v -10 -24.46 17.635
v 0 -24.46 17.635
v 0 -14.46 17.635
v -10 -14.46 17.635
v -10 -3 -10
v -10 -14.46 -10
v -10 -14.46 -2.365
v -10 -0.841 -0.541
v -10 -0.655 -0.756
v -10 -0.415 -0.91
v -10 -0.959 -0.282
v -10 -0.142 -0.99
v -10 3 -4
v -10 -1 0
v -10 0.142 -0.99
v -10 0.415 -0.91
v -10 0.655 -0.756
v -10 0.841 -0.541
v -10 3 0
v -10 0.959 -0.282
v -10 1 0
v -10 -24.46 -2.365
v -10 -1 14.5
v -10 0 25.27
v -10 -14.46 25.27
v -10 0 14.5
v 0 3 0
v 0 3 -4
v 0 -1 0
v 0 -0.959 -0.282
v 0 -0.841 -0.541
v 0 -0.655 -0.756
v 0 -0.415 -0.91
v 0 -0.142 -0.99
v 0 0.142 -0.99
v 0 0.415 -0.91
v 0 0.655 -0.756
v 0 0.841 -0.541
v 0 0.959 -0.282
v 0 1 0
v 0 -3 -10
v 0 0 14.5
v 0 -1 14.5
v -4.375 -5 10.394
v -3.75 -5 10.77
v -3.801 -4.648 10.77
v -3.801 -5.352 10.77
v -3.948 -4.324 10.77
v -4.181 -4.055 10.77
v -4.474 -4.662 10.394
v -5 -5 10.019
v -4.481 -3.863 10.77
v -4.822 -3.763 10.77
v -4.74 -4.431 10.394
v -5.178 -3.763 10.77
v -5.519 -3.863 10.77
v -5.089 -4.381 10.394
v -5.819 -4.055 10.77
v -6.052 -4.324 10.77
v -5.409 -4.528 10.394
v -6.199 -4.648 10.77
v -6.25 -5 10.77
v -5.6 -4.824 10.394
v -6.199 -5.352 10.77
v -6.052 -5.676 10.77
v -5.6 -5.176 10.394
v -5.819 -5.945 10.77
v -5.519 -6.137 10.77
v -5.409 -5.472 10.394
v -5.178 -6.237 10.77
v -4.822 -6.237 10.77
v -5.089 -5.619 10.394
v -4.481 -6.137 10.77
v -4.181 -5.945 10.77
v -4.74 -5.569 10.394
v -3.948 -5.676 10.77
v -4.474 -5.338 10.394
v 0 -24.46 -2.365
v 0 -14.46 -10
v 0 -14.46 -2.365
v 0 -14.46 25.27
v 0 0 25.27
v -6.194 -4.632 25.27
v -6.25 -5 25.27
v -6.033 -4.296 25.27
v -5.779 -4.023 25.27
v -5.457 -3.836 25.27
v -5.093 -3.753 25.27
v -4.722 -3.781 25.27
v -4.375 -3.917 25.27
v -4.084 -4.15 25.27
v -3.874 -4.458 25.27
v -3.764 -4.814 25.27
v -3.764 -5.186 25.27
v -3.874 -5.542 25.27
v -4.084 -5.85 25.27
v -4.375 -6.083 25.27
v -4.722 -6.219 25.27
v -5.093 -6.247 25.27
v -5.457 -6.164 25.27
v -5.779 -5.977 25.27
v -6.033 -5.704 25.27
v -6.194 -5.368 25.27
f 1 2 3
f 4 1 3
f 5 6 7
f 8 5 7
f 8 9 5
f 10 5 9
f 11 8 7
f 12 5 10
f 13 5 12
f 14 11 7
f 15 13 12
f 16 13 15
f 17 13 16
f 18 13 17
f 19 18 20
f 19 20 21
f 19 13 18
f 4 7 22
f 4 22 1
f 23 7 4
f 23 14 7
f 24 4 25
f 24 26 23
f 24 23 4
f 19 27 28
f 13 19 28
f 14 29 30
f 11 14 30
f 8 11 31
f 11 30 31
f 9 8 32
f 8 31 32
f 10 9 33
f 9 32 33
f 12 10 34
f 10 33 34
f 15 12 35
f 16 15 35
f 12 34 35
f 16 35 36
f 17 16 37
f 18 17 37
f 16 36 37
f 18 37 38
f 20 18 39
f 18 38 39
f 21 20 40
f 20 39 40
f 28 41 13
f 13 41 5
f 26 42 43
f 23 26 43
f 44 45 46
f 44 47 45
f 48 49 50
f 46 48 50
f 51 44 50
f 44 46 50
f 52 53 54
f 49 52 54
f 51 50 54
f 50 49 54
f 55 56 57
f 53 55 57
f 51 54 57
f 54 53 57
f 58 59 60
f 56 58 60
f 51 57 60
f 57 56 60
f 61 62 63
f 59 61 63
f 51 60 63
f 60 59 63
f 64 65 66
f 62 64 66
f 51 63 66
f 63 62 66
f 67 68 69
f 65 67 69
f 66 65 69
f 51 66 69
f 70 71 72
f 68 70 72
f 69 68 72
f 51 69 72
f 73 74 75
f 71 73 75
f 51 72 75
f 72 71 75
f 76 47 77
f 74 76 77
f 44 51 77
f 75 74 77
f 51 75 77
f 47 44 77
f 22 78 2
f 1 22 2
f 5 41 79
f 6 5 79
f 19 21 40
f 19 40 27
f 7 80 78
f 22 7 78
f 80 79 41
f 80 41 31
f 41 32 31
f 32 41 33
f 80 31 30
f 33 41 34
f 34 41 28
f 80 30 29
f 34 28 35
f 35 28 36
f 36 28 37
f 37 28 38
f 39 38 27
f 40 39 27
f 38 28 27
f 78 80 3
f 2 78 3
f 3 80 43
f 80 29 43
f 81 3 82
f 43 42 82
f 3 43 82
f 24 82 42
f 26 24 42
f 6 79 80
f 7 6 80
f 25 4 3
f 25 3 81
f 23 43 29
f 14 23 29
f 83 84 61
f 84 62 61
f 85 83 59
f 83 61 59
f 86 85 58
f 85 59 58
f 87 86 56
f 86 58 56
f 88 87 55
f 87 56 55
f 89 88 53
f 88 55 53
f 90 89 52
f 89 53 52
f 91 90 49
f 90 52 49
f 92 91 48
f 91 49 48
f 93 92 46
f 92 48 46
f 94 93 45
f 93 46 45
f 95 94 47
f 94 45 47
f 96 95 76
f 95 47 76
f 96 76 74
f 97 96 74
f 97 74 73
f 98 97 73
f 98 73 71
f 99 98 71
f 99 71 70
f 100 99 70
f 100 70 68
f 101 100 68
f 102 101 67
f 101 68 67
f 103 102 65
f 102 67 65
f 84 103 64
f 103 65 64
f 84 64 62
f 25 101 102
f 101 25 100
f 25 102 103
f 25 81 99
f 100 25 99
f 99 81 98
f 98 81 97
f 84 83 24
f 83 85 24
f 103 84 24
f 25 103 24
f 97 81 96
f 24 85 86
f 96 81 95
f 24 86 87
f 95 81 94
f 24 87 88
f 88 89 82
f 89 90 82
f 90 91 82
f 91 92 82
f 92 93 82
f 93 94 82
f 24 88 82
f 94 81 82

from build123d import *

# Parameters (mm, degrees)
BOSS_EXTRUDE1_DEPTH       = 10
CHAMFER1_SIZE             = 6
M3X0_5_TAPPED_HOLE1_D     = 2.5
M3X0_5_TAPPED_HOLE1_DEPTH = 14.5
M3X0_5_TAPPED_HOLE1_TIP   = 0.751075774


with BuildPart() as part:
    # Sketch1 → Boss-Extrude1 (new body)
    with BuildSketch(Plane(origin=(0, 0, 0), x_dir=(0, 0, -1), z_dir=(1, 0, 0))):
        with BuildLine():
            Line((0, 1), (0, 3))
            Line((0, 3), (10, 3))
            Line((10, 3), (10, -14.46))
            Line((10, -14.46), (2.365, -14.46))
            Line((2.365, -14.46), (2.365, -24.46))
            Line((2.365, -24.46), (-17.635, -24.46))
            Line((-17.635, -24.46), (-17.635, -14.46))
            Line((-17.635, -14.46), (-25.27, -14.46))
            Line((-25.27, -14.46), (-25.27, 0))
            Line((-25.27, 0), (-14.5, 0))
            Line((-14.5, 0), (-14.5, -1))
            Line((-14.5, -1), (0, -1))
            ThreePointArc((0, -1), (1, 0), (0, 1))
        make_face()
    extrude(amount=-BOSS_EXTRUDE1_DEPTH)

    # Chamfer1
    chamfer1_edges = [part.edges().sort_by_distance(p)[0] for p in [
        (-5, 3, -10),
    ]]
    chamfer(chamfer1_edges, length=CHAMFER1_SIZE)

    # M3x0.5 Tapped Hole1
    with Locations(Plane(origin=(-5, -5, 25.27), x_dir=(1, 0, 0), z_dir=(0, 0, 1))):
        with Locations((0, 0)):
            Hole(M3X0_5_TAPPED_HOLE1_D / 2, depth=M3X0_5_TAPPED_HOLE1_DEPTH)
            with Locations((0, 0, -(M3X0_5_TAPPED_HOLE1_DEPTH + M3X0_5_TAPPED_HOLE1_TIP / 2))):  # 118° drill point
                Cone(0, M3X0_5_TAPPED_HOLE1_D / 2, M3X0_5_TAPPED_HOLE1_TIP, mode=Mode.SUBTRACT)


solid = part.part
